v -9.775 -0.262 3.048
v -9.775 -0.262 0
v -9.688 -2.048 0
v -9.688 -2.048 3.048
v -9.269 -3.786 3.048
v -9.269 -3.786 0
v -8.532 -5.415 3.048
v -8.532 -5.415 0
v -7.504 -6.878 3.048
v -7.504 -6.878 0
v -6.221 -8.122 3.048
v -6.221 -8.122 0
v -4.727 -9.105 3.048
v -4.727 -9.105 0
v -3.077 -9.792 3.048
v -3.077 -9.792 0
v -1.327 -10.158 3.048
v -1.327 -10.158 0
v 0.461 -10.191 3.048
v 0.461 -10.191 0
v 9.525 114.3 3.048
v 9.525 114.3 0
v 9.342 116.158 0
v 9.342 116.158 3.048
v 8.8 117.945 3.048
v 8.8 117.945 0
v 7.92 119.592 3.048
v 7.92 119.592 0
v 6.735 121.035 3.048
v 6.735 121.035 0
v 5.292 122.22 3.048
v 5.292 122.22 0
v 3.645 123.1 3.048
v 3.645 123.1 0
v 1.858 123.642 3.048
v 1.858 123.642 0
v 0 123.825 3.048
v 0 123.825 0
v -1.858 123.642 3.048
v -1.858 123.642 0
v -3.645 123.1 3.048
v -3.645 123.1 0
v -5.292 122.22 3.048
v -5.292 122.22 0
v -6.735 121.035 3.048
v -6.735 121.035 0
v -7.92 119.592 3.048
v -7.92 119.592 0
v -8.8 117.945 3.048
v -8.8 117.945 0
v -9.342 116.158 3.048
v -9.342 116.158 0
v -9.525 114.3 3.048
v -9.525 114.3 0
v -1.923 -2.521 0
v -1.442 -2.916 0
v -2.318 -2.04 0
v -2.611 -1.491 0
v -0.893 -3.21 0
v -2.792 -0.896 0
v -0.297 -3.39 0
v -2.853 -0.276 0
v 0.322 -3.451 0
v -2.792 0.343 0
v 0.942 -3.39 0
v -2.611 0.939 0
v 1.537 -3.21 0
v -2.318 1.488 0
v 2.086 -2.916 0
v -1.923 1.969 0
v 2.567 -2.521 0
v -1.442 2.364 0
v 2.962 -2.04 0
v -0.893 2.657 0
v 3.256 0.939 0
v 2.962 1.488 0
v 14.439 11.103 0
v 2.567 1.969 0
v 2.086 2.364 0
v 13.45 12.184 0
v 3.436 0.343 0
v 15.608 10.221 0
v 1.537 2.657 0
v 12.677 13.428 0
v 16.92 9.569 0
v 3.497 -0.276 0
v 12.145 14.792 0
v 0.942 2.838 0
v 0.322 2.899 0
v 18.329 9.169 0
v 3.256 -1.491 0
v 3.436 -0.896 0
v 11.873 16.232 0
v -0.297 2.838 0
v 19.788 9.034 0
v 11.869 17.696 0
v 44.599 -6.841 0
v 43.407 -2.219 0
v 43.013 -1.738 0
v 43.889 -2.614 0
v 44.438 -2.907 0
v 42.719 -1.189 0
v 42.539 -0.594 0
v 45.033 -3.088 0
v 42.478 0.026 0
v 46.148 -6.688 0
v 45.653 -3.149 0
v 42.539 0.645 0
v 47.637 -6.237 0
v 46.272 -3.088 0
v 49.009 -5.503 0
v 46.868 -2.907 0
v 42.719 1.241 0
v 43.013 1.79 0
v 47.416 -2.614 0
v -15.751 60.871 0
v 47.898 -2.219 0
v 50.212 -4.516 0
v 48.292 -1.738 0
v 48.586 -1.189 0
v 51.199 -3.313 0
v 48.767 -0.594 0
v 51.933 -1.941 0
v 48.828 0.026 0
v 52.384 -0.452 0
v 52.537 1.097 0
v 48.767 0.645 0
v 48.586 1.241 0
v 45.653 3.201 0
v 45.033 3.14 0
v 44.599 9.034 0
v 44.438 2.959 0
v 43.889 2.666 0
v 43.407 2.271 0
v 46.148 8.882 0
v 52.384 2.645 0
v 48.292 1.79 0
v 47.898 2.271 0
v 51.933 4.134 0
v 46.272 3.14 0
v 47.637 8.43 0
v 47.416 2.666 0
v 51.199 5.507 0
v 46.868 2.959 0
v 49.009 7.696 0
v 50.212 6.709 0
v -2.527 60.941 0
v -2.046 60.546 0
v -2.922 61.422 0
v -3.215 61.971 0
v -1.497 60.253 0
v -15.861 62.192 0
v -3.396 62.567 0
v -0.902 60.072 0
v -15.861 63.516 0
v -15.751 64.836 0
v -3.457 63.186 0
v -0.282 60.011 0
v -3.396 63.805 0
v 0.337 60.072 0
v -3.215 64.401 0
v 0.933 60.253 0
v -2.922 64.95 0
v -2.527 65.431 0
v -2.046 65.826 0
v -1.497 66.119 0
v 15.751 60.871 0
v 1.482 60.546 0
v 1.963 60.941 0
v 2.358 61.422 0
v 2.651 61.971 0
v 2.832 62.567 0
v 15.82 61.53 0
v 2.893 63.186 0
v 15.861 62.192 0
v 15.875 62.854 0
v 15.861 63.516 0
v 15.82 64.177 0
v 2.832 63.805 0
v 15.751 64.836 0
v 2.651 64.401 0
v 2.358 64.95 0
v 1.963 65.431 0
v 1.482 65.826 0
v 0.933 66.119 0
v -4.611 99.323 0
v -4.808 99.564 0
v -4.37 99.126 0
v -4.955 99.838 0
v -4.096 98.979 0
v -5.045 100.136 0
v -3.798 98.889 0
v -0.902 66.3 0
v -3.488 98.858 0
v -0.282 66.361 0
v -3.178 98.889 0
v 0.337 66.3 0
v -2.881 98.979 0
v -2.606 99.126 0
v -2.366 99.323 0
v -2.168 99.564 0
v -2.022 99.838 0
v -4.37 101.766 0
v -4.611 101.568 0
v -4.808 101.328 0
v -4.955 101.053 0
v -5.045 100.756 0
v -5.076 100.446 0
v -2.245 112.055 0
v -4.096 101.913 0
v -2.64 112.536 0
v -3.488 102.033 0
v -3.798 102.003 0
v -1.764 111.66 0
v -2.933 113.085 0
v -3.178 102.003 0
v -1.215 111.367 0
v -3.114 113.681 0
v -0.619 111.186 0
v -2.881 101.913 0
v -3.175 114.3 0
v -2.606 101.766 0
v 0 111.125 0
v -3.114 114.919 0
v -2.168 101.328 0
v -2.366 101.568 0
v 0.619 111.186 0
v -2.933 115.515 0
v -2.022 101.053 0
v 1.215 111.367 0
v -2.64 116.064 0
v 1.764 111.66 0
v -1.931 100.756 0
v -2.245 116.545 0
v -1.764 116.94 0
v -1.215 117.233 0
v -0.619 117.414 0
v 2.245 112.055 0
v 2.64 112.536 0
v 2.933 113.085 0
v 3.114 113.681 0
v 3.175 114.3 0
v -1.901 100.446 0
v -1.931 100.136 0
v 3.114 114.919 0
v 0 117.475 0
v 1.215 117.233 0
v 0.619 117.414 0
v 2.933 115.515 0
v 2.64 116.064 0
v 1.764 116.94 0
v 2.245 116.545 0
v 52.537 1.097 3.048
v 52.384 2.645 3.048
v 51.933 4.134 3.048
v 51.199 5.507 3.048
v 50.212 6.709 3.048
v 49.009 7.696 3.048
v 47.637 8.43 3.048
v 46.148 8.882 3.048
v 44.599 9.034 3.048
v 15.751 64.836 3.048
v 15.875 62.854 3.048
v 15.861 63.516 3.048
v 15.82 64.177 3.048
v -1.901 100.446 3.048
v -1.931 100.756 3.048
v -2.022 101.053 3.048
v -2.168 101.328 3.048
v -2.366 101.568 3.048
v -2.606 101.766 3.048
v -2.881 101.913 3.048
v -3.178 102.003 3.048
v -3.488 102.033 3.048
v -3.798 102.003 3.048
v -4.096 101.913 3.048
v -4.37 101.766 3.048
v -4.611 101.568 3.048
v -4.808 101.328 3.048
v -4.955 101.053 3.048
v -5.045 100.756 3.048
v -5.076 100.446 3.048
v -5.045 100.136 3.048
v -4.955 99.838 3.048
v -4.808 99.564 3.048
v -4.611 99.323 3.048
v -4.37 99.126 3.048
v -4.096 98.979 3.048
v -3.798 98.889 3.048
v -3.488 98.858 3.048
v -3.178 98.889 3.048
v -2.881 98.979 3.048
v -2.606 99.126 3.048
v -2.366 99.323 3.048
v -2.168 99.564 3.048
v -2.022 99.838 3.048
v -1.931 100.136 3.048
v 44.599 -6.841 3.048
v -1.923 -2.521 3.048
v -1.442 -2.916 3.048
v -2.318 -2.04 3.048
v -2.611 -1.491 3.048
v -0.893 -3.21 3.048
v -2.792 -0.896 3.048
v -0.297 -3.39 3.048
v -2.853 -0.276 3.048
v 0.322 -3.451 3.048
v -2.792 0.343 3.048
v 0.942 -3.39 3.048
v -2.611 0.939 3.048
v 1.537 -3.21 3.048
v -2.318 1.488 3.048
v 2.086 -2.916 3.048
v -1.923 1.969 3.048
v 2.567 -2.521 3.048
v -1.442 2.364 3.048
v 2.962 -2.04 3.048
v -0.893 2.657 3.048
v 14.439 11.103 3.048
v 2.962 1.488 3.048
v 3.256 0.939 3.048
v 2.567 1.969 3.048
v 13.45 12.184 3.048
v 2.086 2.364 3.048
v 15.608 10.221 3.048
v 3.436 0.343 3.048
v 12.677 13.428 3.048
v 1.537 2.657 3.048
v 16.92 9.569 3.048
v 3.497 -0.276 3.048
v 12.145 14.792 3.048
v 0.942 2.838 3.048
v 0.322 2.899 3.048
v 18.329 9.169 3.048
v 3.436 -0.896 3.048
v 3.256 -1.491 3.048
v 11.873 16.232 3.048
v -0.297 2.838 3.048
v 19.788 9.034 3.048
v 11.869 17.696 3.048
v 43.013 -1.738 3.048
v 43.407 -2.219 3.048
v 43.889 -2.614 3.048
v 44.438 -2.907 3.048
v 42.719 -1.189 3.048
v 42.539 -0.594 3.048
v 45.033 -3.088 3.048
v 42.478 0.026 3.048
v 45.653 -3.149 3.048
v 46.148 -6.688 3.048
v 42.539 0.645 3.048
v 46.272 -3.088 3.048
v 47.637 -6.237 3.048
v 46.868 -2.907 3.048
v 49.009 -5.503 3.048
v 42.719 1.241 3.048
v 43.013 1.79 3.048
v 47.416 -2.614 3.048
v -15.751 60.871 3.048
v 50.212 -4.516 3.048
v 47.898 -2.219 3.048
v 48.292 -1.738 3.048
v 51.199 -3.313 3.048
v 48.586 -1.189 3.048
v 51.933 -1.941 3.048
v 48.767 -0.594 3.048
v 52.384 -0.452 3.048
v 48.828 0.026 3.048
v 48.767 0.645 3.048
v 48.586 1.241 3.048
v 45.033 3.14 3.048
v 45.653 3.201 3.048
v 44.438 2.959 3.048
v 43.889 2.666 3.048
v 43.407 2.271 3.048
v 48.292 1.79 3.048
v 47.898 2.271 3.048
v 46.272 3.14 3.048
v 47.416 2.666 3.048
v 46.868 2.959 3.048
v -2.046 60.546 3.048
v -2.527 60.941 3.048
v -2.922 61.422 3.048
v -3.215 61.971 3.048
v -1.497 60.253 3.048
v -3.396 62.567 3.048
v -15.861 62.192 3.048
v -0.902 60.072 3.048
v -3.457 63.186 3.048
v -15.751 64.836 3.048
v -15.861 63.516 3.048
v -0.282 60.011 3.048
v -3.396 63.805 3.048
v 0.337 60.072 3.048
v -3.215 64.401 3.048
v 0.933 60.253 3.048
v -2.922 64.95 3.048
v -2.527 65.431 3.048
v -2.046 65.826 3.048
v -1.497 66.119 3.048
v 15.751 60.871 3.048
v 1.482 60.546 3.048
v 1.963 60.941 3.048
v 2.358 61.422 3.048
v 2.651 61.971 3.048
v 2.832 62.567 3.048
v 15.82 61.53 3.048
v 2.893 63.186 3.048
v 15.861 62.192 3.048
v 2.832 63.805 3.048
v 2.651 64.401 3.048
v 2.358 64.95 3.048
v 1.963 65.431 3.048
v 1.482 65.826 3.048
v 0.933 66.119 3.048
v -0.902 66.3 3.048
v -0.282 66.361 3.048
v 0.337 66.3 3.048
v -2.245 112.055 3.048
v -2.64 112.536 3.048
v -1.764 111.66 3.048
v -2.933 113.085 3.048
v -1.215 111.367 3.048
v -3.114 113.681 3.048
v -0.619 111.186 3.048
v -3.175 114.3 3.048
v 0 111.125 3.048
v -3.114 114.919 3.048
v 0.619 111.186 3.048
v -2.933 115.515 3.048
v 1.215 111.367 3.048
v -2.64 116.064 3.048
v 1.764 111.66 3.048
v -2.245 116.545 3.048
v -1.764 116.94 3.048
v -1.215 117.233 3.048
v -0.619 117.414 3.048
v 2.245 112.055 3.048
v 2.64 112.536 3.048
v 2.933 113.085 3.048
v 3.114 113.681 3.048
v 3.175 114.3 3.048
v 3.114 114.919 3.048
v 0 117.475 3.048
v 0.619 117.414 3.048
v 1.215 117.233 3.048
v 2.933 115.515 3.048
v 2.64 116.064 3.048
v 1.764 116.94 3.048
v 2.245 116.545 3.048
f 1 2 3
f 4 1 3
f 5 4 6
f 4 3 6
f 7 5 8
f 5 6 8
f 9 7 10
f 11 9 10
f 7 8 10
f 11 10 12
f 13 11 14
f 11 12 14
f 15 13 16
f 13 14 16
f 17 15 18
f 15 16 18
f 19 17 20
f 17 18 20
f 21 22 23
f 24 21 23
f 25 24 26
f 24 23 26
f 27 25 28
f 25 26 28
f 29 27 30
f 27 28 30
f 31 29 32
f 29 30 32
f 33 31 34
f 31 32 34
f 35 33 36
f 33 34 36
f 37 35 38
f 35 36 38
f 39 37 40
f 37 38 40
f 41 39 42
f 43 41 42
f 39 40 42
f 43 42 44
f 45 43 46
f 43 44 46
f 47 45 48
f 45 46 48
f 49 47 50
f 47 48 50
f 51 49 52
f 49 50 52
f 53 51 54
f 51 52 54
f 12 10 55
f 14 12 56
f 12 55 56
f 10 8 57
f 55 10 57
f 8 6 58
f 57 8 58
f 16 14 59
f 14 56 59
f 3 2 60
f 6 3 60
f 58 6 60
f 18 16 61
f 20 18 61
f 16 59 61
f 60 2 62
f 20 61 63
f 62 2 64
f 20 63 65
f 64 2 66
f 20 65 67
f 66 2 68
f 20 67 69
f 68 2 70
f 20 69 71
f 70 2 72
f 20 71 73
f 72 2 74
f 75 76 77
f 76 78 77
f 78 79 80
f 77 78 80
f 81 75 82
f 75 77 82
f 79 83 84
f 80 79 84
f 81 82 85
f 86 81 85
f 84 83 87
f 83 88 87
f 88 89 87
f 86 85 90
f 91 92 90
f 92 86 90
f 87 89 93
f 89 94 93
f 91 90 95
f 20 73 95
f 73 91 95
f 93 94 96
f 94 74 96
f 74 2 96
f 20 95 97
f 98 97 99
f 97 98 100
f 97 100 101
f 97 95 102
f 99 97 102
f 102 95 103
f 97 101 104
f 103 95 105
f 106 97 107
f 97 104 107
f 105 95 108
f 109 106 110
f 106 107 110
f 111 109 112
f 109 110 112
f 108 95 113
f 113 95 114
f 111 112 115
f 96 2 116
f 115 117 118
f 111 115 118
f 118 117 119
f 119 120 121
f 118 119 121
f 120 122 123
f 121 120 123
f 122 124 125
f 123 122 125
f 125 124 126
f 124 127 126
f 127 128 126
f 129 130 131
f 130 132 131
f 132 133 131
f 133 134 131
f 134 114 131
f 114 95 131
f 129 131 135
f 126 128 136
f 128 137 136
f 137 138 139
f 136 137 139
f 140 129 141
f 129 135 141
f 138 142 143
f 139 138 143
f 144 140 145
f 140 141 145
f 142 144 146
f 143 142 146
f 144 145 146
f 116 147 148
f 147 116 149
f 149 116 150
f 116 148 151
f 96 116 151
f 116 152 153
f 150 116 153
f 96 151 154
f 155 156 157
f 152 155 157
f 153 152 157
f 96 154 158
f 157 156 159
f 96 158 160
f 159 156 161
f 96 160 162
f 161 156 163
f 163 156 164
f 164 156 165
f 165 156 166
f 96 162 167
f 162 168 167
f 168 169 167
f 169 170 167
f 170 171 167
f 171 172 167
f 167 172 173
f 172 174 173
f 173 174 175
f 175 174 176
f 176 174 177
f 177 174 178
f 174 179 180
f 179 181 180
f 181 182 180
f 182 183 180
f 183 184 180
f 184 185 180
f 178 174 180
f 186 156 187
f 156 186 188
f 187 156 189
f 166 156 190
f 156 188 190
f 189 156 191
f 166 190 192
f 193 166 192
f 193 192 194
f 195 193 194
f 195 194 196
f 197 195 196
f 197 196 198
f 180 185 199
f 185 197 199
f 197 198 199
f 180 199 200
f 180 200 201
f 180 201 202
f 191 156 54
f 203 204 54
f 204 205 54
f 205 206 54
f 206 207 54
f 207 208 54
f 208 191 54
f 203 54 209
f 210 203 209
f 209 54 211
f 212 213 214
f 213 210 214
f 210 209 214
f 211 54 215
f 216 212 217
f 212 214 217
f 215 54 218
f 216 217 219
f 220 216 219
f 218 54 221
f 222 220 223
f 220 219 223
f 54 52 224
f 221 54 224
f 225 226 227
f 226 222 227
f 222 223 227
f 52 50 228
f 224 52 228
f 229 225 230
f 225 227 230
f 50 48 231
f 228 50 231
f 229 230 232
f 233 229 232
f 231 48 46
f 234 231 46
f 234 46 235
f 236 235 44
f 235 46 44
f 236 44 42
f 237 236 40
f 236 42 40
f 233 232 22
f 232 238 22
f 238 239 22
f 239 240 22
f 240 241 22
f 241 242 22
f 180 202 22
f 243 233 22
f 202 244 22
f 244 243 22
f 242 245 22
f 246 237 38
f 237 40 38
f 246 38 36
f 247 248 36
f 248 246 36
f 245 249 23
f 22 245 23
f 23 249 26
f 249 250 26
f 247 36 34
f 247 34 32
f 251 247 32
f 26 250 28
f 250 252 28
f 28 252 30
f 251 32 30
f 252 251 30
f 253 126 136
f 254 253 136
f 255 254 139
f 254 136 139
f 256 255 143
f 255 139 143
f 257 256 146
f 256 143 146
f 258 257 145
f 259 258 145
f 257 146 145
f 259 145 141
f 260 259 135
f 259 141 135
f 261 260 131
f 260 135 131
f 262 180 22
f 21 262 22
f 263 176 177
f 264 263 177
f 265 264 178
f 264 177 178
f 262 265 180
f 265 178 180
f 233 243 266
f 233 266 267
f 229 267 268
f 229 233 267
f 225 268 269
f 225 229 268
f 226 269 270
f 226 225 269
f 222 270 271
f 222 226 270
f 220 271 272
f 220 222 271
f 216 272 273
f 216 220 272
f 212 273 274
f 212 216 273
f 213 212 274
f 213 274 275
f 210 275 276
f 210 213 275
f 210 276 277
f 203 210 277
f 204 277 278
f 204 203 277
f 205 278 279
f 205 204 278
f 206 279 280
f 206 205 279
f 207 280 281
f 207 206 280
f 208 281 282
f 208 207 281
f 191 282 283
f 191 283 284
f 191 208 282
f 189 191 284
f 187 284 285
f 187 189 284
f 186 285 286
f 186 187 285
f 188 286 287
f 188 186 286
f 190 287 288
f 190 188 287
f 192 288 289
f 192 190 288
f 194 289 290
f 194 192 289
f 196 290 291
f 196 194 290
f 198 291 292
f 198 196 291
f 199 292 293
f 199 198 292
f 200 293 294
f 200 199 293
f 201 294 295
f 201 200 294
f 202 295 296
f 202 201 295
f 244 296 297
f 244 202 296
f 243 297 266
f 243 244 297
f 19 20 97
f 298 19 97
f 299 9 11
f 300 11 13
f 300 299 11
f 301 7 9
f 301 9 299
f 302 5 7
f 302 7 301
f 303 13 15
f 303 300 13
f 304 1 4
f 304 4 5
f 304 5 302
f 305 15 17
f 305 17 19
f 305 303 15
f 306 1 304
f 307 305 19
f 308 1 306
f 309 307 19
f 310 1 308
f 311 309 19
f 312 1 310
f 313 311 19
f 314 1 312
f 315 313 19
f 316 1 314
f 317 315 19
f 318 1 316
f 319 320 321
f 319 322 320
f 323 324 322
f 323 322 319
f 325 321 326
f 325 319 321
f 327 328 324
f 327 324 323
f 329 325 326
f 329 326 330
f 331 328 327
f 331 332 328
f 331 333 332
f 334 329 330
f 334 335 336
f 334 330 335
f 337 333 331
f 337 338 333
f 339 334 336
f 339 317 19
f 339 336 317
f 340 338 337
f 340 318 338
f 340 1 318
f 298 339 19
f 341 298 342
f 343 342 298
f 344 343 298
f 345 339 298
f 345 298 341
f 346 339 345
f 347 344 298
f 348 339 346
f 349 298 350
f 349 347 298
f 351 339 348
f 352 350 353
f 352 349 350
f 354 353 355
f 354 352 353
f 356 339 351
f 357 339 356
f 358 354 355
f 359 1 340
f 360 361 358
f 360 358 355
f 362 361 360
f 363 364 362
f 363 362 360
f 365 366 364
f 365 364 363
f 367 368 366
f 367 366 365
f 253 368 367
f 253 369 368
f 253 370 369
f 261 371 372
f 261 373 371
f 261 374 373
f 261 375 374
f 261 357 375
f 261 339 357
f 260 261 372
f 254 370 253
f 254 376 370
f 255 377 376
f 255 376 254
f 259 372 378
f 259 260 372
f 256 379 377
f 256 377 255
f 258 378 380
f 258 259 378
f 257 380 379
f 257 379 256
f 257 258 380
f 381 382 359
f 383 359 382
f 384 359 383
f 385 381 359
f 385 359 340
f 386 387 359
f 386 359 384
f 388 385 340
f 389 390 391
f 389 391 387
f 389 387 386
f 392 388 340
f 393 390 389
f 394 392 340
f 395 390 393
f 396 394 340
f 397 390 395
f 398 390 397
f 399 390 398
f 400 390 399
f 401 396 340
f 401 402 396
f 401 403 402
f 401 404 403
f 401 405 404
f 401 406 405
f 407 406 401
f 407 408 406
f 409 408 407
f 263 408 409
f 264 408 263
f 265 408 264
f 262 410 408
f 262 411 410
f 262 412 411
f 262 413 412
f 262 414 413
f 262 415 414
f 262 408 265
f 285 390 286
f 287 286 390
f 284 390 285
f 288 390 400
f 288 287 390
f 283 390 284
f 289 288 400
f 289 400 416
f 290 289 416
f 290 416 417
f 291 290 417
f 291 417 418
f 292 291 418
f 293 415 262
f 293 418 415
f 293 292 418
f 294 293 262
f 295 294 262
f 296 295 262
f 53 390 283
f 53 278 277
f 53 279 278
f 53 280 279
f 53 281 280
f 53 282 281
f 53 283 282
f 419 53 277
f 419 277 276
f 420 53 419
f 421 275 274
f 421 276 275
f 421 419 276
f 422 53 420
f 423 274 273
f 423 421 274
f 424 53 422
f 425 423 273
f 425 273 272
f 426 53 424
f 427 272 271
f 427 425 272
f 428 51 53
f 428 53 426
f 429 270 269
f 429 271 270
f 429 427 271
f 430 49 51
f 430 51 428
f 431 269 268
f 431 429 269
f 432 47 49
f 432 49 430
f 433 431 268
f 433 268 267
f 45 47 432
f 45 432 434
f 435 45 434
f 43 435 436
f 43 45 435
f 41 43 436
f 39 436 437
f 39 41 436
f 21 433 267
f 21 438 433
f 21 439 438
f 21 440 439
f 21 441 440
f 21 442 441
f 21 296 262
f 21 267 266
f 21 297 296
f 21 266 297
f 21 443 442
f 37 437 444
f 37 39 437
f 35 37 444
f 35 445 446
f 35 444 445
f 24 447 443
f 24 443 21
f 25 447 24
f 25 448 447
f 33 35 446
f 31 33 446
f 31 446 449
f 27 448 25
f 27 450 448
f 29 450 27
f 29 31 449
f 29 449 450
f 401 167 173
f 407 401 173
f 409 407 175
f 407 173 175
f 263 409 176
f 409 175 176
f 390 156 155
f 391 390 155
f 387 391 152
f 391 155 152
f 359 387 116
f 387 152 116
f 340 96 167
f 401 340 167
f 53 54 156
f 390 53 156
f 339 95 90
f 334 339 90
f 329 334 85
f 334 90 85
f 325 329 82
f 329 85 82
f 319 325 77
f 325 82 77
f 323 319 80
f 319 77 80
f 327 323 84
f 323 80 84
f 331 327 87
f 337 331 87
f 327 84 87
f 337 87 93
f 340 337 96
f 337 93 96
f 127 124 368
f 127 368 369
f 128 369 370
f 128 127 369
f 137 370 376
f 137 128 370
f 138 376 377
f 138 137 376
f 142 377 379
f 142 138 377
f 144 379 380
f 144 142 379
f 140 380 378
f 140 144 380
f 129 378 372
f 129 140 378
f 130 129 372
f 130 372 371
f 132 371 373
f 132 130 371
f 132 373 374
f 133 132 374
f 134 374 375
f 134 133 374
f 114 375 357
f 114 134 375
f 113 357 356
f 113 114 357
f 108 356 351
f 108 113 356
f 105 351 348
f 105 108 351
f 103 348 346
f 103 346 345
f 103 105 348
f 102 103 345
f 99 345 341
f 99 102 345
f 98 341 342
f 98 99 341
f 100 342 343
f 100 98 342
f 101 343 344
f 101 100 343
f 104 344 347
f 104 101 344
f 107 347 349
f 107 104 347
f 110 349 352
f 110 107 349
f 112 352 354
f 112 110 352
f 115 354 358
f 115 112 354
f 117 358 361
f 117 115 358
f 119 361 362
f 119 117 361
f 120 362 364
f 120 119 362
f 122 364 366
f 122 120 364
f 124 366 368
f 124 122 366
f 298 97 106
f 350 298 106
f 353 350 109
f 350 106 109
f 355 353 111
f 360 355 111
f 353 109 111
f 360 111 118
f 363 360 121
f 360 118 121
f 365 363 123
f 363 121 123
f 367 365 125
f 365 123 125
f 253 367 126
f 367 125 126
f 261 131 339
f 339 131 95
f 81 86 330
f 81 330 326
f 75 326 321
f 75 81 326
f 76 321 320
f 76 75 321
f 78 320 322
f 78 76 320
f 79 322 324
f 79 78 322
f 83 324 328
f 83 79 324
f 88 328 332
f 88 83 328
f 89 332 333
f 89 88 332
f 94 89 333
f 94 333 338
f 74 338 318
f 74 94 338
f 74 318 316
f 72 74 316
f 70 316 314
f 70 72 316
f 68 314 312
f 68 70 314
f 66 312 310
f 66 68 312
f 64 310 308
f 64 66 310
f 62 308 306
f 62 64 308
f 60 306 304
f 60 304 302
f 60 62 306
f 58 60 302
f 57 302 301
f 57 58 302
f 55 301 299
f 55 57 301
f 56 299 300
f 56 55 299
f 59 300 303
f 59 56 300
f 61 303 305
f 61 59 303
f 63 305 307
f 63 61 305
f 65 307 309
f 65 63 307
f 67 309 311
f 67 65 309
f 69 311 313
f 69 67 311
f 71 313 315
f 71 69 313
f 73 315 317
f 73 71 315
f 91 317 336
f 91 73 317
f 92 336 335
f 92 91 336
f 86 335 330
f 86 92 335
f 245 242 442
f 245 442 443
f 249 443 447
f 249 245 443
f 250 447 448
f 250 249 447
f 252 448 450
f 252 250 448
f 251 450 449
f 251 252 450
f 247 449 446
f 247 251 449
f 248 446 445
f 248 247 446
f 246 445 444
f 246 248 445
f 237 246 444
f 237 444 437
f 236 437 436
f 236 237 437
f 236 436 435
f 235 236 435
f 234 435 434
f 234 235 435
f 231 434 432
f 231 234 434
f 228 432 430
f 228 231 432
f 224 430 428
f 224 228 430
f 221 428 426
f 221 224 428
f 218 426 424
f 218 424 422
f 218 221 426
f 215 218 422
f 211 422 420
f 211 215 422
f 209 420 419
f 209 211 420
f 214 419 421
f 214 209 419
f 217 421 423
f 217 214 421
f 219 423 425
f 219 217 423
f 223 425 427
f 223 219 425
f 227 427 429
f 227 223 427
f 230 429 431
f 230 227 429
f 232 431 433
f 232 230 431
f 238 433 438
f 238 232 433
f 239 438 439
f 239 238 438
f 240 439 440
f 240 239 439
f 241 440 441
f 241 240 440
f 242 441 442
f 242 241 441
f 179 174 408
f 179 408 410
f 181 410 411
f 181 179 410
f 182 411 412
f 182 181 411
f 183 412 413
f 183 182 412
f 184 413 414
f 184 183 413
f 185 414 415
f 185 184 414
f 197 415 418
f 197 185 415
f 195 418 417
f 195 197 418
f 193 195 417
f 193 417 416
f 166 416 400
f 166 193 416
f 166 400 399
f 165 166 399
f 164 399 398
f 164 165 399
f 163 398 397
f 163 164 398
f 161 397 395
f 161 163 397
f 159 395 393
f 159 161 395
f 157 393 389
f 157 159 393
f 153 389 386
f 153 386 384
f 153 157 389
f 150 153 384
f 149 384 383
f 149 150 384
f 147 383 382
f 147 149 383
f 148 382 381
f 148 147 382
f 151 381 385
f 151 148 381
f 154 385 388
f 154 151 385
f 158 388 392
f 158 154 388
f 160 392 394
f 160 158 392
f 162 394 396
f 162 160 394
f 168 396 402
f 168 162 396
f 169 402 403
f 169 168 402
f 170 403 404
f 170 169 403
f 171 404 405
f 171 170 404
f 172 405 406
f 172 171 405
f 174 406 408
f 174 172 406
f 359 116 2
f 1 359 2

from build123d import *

# Parameters (mm, degrees)
F0_R     = 3.175
F0_R_2   = 1.5875
F1_DEPTH = 3.048


with BuildPart() as f1:
    # F0 (on Top) → F1 (new body)
    with BuildSketch(Plane.XY):
        with BuildLine():
            ThreePointArc((-9.525, 114.3), (0, 104.775), (9.525, 114.3))
            ThreePointArc((9.525, 114.3), (0, 123.825), (-9.525, 114.3))
        make_face()
        with Locations((0, 114.3)):
            Circle(F0_R, mode=Mode.SUBTRACT)
        with BuildLine():
            Line((15.750729, 64.836387), (9.525, 114.3))
            ThreePointArc((9.525, 114.3), (0, 104.775), (-9.525, 114.3))
            Line((-9.525, 114.3), (-15.750729, 64.836387))
            ThreePointArc((-15.750729, 64.836387), (0, 78.728924), (15.750729, 64.836387))
        make_face()
        with Locations((-3.488187, 100.445924)):
            Circle(F0_R_2, mode=Mode.SUBTRACT)
        with BuildLine():
            ThreePointArc((15.875, 62.853924), (15.843902, 63.847101), (15.750729, 64.836387))
            ThreePointArc((15.750729, 64.836387), (0, 78.728924), (-15.750729, 64.836387))
            ThreePointArc((-15.750729, 64.836387), (-15.875, 62.853924), (-15.750729, 60.871462))
            ThreePointArc((-15.750729, 60.871462), (0, 46.978924), (15.750729, 60.871462))
            ThreePointArc((15.750729, 60.871462), (15.843902, 61.860747), (15.875, 62.853924))
        make_face()
        with Locations((-0.282163, 63.186049)):
            Circle(F0_R, mode=Mode.SUBTRACT)
        with BuildLine():
            ThreePointArc((15.750729, 60.871462), (0, 46.978924), (-15.750729, 60.871462))
            Line((-15.750729, 60.871462), (-9.77514, -0.262389))
            ThreePointArc((-9.77514, -0.262389), (-0.044493, 8.829508), (9.265119, -0.693056))
            ThreePointArc((9.265119, -0.693056), (6.725519, -7.168379), (0.460961, -10.190741))
            Line((0.460961, -10.190741), (44.5993, -6.840791))
            ThreePointArc((44.5993, -6.840791), (36.6618, 1.096709), (44.5993, 9.034209))
            Line((44.5993, 9.034209), (19.787523, 9.034209))
            ThreePointArc((19.787523, 9.034209), (13.919598, 11.620349), (11.869256, 17.696266))
            Line((11.869256, 17.696266), (15.750729, 60.871462))
        make_face()
        with BuildLine():
            ThreePointArc((9.265119, -0.693056), (-0.044493, 8.829508), (-9.77514, -0.262389))
            ThreePointArc((-9.77514, -0.262389), (-6.891509, -7.530244), (0.460961, -10.190741))
            ThreePointArc((0.460961, -10.190741), (6.725519, -7.168379), (9.265119, -0.693056))
        make_face()
        with Locations((0.322241, -0.276352)):
            Circle(F0_R, mode=Mode.SUBTRACT)
        with BuildLine():
            ThreePointArc((44.5993, 9.034209), (36.6618, 1.096709), (44.5993, -6.840791))
            ThreePointArc((44.5993, -6.840791), (50.21196, -4.515951), (52.5368, 1.096709))
            ThreePointArc((52.5368, 1.096709), (50.21196, 6.709369), (44.5993, 9.034209))
        make_face()
        with Locations((45.652531, 0.025849)):
            Circle(F0_R, mode=Mode.SUBTRACT)
    extrude(amount=F1_DEPTH)


solid = f1.part
